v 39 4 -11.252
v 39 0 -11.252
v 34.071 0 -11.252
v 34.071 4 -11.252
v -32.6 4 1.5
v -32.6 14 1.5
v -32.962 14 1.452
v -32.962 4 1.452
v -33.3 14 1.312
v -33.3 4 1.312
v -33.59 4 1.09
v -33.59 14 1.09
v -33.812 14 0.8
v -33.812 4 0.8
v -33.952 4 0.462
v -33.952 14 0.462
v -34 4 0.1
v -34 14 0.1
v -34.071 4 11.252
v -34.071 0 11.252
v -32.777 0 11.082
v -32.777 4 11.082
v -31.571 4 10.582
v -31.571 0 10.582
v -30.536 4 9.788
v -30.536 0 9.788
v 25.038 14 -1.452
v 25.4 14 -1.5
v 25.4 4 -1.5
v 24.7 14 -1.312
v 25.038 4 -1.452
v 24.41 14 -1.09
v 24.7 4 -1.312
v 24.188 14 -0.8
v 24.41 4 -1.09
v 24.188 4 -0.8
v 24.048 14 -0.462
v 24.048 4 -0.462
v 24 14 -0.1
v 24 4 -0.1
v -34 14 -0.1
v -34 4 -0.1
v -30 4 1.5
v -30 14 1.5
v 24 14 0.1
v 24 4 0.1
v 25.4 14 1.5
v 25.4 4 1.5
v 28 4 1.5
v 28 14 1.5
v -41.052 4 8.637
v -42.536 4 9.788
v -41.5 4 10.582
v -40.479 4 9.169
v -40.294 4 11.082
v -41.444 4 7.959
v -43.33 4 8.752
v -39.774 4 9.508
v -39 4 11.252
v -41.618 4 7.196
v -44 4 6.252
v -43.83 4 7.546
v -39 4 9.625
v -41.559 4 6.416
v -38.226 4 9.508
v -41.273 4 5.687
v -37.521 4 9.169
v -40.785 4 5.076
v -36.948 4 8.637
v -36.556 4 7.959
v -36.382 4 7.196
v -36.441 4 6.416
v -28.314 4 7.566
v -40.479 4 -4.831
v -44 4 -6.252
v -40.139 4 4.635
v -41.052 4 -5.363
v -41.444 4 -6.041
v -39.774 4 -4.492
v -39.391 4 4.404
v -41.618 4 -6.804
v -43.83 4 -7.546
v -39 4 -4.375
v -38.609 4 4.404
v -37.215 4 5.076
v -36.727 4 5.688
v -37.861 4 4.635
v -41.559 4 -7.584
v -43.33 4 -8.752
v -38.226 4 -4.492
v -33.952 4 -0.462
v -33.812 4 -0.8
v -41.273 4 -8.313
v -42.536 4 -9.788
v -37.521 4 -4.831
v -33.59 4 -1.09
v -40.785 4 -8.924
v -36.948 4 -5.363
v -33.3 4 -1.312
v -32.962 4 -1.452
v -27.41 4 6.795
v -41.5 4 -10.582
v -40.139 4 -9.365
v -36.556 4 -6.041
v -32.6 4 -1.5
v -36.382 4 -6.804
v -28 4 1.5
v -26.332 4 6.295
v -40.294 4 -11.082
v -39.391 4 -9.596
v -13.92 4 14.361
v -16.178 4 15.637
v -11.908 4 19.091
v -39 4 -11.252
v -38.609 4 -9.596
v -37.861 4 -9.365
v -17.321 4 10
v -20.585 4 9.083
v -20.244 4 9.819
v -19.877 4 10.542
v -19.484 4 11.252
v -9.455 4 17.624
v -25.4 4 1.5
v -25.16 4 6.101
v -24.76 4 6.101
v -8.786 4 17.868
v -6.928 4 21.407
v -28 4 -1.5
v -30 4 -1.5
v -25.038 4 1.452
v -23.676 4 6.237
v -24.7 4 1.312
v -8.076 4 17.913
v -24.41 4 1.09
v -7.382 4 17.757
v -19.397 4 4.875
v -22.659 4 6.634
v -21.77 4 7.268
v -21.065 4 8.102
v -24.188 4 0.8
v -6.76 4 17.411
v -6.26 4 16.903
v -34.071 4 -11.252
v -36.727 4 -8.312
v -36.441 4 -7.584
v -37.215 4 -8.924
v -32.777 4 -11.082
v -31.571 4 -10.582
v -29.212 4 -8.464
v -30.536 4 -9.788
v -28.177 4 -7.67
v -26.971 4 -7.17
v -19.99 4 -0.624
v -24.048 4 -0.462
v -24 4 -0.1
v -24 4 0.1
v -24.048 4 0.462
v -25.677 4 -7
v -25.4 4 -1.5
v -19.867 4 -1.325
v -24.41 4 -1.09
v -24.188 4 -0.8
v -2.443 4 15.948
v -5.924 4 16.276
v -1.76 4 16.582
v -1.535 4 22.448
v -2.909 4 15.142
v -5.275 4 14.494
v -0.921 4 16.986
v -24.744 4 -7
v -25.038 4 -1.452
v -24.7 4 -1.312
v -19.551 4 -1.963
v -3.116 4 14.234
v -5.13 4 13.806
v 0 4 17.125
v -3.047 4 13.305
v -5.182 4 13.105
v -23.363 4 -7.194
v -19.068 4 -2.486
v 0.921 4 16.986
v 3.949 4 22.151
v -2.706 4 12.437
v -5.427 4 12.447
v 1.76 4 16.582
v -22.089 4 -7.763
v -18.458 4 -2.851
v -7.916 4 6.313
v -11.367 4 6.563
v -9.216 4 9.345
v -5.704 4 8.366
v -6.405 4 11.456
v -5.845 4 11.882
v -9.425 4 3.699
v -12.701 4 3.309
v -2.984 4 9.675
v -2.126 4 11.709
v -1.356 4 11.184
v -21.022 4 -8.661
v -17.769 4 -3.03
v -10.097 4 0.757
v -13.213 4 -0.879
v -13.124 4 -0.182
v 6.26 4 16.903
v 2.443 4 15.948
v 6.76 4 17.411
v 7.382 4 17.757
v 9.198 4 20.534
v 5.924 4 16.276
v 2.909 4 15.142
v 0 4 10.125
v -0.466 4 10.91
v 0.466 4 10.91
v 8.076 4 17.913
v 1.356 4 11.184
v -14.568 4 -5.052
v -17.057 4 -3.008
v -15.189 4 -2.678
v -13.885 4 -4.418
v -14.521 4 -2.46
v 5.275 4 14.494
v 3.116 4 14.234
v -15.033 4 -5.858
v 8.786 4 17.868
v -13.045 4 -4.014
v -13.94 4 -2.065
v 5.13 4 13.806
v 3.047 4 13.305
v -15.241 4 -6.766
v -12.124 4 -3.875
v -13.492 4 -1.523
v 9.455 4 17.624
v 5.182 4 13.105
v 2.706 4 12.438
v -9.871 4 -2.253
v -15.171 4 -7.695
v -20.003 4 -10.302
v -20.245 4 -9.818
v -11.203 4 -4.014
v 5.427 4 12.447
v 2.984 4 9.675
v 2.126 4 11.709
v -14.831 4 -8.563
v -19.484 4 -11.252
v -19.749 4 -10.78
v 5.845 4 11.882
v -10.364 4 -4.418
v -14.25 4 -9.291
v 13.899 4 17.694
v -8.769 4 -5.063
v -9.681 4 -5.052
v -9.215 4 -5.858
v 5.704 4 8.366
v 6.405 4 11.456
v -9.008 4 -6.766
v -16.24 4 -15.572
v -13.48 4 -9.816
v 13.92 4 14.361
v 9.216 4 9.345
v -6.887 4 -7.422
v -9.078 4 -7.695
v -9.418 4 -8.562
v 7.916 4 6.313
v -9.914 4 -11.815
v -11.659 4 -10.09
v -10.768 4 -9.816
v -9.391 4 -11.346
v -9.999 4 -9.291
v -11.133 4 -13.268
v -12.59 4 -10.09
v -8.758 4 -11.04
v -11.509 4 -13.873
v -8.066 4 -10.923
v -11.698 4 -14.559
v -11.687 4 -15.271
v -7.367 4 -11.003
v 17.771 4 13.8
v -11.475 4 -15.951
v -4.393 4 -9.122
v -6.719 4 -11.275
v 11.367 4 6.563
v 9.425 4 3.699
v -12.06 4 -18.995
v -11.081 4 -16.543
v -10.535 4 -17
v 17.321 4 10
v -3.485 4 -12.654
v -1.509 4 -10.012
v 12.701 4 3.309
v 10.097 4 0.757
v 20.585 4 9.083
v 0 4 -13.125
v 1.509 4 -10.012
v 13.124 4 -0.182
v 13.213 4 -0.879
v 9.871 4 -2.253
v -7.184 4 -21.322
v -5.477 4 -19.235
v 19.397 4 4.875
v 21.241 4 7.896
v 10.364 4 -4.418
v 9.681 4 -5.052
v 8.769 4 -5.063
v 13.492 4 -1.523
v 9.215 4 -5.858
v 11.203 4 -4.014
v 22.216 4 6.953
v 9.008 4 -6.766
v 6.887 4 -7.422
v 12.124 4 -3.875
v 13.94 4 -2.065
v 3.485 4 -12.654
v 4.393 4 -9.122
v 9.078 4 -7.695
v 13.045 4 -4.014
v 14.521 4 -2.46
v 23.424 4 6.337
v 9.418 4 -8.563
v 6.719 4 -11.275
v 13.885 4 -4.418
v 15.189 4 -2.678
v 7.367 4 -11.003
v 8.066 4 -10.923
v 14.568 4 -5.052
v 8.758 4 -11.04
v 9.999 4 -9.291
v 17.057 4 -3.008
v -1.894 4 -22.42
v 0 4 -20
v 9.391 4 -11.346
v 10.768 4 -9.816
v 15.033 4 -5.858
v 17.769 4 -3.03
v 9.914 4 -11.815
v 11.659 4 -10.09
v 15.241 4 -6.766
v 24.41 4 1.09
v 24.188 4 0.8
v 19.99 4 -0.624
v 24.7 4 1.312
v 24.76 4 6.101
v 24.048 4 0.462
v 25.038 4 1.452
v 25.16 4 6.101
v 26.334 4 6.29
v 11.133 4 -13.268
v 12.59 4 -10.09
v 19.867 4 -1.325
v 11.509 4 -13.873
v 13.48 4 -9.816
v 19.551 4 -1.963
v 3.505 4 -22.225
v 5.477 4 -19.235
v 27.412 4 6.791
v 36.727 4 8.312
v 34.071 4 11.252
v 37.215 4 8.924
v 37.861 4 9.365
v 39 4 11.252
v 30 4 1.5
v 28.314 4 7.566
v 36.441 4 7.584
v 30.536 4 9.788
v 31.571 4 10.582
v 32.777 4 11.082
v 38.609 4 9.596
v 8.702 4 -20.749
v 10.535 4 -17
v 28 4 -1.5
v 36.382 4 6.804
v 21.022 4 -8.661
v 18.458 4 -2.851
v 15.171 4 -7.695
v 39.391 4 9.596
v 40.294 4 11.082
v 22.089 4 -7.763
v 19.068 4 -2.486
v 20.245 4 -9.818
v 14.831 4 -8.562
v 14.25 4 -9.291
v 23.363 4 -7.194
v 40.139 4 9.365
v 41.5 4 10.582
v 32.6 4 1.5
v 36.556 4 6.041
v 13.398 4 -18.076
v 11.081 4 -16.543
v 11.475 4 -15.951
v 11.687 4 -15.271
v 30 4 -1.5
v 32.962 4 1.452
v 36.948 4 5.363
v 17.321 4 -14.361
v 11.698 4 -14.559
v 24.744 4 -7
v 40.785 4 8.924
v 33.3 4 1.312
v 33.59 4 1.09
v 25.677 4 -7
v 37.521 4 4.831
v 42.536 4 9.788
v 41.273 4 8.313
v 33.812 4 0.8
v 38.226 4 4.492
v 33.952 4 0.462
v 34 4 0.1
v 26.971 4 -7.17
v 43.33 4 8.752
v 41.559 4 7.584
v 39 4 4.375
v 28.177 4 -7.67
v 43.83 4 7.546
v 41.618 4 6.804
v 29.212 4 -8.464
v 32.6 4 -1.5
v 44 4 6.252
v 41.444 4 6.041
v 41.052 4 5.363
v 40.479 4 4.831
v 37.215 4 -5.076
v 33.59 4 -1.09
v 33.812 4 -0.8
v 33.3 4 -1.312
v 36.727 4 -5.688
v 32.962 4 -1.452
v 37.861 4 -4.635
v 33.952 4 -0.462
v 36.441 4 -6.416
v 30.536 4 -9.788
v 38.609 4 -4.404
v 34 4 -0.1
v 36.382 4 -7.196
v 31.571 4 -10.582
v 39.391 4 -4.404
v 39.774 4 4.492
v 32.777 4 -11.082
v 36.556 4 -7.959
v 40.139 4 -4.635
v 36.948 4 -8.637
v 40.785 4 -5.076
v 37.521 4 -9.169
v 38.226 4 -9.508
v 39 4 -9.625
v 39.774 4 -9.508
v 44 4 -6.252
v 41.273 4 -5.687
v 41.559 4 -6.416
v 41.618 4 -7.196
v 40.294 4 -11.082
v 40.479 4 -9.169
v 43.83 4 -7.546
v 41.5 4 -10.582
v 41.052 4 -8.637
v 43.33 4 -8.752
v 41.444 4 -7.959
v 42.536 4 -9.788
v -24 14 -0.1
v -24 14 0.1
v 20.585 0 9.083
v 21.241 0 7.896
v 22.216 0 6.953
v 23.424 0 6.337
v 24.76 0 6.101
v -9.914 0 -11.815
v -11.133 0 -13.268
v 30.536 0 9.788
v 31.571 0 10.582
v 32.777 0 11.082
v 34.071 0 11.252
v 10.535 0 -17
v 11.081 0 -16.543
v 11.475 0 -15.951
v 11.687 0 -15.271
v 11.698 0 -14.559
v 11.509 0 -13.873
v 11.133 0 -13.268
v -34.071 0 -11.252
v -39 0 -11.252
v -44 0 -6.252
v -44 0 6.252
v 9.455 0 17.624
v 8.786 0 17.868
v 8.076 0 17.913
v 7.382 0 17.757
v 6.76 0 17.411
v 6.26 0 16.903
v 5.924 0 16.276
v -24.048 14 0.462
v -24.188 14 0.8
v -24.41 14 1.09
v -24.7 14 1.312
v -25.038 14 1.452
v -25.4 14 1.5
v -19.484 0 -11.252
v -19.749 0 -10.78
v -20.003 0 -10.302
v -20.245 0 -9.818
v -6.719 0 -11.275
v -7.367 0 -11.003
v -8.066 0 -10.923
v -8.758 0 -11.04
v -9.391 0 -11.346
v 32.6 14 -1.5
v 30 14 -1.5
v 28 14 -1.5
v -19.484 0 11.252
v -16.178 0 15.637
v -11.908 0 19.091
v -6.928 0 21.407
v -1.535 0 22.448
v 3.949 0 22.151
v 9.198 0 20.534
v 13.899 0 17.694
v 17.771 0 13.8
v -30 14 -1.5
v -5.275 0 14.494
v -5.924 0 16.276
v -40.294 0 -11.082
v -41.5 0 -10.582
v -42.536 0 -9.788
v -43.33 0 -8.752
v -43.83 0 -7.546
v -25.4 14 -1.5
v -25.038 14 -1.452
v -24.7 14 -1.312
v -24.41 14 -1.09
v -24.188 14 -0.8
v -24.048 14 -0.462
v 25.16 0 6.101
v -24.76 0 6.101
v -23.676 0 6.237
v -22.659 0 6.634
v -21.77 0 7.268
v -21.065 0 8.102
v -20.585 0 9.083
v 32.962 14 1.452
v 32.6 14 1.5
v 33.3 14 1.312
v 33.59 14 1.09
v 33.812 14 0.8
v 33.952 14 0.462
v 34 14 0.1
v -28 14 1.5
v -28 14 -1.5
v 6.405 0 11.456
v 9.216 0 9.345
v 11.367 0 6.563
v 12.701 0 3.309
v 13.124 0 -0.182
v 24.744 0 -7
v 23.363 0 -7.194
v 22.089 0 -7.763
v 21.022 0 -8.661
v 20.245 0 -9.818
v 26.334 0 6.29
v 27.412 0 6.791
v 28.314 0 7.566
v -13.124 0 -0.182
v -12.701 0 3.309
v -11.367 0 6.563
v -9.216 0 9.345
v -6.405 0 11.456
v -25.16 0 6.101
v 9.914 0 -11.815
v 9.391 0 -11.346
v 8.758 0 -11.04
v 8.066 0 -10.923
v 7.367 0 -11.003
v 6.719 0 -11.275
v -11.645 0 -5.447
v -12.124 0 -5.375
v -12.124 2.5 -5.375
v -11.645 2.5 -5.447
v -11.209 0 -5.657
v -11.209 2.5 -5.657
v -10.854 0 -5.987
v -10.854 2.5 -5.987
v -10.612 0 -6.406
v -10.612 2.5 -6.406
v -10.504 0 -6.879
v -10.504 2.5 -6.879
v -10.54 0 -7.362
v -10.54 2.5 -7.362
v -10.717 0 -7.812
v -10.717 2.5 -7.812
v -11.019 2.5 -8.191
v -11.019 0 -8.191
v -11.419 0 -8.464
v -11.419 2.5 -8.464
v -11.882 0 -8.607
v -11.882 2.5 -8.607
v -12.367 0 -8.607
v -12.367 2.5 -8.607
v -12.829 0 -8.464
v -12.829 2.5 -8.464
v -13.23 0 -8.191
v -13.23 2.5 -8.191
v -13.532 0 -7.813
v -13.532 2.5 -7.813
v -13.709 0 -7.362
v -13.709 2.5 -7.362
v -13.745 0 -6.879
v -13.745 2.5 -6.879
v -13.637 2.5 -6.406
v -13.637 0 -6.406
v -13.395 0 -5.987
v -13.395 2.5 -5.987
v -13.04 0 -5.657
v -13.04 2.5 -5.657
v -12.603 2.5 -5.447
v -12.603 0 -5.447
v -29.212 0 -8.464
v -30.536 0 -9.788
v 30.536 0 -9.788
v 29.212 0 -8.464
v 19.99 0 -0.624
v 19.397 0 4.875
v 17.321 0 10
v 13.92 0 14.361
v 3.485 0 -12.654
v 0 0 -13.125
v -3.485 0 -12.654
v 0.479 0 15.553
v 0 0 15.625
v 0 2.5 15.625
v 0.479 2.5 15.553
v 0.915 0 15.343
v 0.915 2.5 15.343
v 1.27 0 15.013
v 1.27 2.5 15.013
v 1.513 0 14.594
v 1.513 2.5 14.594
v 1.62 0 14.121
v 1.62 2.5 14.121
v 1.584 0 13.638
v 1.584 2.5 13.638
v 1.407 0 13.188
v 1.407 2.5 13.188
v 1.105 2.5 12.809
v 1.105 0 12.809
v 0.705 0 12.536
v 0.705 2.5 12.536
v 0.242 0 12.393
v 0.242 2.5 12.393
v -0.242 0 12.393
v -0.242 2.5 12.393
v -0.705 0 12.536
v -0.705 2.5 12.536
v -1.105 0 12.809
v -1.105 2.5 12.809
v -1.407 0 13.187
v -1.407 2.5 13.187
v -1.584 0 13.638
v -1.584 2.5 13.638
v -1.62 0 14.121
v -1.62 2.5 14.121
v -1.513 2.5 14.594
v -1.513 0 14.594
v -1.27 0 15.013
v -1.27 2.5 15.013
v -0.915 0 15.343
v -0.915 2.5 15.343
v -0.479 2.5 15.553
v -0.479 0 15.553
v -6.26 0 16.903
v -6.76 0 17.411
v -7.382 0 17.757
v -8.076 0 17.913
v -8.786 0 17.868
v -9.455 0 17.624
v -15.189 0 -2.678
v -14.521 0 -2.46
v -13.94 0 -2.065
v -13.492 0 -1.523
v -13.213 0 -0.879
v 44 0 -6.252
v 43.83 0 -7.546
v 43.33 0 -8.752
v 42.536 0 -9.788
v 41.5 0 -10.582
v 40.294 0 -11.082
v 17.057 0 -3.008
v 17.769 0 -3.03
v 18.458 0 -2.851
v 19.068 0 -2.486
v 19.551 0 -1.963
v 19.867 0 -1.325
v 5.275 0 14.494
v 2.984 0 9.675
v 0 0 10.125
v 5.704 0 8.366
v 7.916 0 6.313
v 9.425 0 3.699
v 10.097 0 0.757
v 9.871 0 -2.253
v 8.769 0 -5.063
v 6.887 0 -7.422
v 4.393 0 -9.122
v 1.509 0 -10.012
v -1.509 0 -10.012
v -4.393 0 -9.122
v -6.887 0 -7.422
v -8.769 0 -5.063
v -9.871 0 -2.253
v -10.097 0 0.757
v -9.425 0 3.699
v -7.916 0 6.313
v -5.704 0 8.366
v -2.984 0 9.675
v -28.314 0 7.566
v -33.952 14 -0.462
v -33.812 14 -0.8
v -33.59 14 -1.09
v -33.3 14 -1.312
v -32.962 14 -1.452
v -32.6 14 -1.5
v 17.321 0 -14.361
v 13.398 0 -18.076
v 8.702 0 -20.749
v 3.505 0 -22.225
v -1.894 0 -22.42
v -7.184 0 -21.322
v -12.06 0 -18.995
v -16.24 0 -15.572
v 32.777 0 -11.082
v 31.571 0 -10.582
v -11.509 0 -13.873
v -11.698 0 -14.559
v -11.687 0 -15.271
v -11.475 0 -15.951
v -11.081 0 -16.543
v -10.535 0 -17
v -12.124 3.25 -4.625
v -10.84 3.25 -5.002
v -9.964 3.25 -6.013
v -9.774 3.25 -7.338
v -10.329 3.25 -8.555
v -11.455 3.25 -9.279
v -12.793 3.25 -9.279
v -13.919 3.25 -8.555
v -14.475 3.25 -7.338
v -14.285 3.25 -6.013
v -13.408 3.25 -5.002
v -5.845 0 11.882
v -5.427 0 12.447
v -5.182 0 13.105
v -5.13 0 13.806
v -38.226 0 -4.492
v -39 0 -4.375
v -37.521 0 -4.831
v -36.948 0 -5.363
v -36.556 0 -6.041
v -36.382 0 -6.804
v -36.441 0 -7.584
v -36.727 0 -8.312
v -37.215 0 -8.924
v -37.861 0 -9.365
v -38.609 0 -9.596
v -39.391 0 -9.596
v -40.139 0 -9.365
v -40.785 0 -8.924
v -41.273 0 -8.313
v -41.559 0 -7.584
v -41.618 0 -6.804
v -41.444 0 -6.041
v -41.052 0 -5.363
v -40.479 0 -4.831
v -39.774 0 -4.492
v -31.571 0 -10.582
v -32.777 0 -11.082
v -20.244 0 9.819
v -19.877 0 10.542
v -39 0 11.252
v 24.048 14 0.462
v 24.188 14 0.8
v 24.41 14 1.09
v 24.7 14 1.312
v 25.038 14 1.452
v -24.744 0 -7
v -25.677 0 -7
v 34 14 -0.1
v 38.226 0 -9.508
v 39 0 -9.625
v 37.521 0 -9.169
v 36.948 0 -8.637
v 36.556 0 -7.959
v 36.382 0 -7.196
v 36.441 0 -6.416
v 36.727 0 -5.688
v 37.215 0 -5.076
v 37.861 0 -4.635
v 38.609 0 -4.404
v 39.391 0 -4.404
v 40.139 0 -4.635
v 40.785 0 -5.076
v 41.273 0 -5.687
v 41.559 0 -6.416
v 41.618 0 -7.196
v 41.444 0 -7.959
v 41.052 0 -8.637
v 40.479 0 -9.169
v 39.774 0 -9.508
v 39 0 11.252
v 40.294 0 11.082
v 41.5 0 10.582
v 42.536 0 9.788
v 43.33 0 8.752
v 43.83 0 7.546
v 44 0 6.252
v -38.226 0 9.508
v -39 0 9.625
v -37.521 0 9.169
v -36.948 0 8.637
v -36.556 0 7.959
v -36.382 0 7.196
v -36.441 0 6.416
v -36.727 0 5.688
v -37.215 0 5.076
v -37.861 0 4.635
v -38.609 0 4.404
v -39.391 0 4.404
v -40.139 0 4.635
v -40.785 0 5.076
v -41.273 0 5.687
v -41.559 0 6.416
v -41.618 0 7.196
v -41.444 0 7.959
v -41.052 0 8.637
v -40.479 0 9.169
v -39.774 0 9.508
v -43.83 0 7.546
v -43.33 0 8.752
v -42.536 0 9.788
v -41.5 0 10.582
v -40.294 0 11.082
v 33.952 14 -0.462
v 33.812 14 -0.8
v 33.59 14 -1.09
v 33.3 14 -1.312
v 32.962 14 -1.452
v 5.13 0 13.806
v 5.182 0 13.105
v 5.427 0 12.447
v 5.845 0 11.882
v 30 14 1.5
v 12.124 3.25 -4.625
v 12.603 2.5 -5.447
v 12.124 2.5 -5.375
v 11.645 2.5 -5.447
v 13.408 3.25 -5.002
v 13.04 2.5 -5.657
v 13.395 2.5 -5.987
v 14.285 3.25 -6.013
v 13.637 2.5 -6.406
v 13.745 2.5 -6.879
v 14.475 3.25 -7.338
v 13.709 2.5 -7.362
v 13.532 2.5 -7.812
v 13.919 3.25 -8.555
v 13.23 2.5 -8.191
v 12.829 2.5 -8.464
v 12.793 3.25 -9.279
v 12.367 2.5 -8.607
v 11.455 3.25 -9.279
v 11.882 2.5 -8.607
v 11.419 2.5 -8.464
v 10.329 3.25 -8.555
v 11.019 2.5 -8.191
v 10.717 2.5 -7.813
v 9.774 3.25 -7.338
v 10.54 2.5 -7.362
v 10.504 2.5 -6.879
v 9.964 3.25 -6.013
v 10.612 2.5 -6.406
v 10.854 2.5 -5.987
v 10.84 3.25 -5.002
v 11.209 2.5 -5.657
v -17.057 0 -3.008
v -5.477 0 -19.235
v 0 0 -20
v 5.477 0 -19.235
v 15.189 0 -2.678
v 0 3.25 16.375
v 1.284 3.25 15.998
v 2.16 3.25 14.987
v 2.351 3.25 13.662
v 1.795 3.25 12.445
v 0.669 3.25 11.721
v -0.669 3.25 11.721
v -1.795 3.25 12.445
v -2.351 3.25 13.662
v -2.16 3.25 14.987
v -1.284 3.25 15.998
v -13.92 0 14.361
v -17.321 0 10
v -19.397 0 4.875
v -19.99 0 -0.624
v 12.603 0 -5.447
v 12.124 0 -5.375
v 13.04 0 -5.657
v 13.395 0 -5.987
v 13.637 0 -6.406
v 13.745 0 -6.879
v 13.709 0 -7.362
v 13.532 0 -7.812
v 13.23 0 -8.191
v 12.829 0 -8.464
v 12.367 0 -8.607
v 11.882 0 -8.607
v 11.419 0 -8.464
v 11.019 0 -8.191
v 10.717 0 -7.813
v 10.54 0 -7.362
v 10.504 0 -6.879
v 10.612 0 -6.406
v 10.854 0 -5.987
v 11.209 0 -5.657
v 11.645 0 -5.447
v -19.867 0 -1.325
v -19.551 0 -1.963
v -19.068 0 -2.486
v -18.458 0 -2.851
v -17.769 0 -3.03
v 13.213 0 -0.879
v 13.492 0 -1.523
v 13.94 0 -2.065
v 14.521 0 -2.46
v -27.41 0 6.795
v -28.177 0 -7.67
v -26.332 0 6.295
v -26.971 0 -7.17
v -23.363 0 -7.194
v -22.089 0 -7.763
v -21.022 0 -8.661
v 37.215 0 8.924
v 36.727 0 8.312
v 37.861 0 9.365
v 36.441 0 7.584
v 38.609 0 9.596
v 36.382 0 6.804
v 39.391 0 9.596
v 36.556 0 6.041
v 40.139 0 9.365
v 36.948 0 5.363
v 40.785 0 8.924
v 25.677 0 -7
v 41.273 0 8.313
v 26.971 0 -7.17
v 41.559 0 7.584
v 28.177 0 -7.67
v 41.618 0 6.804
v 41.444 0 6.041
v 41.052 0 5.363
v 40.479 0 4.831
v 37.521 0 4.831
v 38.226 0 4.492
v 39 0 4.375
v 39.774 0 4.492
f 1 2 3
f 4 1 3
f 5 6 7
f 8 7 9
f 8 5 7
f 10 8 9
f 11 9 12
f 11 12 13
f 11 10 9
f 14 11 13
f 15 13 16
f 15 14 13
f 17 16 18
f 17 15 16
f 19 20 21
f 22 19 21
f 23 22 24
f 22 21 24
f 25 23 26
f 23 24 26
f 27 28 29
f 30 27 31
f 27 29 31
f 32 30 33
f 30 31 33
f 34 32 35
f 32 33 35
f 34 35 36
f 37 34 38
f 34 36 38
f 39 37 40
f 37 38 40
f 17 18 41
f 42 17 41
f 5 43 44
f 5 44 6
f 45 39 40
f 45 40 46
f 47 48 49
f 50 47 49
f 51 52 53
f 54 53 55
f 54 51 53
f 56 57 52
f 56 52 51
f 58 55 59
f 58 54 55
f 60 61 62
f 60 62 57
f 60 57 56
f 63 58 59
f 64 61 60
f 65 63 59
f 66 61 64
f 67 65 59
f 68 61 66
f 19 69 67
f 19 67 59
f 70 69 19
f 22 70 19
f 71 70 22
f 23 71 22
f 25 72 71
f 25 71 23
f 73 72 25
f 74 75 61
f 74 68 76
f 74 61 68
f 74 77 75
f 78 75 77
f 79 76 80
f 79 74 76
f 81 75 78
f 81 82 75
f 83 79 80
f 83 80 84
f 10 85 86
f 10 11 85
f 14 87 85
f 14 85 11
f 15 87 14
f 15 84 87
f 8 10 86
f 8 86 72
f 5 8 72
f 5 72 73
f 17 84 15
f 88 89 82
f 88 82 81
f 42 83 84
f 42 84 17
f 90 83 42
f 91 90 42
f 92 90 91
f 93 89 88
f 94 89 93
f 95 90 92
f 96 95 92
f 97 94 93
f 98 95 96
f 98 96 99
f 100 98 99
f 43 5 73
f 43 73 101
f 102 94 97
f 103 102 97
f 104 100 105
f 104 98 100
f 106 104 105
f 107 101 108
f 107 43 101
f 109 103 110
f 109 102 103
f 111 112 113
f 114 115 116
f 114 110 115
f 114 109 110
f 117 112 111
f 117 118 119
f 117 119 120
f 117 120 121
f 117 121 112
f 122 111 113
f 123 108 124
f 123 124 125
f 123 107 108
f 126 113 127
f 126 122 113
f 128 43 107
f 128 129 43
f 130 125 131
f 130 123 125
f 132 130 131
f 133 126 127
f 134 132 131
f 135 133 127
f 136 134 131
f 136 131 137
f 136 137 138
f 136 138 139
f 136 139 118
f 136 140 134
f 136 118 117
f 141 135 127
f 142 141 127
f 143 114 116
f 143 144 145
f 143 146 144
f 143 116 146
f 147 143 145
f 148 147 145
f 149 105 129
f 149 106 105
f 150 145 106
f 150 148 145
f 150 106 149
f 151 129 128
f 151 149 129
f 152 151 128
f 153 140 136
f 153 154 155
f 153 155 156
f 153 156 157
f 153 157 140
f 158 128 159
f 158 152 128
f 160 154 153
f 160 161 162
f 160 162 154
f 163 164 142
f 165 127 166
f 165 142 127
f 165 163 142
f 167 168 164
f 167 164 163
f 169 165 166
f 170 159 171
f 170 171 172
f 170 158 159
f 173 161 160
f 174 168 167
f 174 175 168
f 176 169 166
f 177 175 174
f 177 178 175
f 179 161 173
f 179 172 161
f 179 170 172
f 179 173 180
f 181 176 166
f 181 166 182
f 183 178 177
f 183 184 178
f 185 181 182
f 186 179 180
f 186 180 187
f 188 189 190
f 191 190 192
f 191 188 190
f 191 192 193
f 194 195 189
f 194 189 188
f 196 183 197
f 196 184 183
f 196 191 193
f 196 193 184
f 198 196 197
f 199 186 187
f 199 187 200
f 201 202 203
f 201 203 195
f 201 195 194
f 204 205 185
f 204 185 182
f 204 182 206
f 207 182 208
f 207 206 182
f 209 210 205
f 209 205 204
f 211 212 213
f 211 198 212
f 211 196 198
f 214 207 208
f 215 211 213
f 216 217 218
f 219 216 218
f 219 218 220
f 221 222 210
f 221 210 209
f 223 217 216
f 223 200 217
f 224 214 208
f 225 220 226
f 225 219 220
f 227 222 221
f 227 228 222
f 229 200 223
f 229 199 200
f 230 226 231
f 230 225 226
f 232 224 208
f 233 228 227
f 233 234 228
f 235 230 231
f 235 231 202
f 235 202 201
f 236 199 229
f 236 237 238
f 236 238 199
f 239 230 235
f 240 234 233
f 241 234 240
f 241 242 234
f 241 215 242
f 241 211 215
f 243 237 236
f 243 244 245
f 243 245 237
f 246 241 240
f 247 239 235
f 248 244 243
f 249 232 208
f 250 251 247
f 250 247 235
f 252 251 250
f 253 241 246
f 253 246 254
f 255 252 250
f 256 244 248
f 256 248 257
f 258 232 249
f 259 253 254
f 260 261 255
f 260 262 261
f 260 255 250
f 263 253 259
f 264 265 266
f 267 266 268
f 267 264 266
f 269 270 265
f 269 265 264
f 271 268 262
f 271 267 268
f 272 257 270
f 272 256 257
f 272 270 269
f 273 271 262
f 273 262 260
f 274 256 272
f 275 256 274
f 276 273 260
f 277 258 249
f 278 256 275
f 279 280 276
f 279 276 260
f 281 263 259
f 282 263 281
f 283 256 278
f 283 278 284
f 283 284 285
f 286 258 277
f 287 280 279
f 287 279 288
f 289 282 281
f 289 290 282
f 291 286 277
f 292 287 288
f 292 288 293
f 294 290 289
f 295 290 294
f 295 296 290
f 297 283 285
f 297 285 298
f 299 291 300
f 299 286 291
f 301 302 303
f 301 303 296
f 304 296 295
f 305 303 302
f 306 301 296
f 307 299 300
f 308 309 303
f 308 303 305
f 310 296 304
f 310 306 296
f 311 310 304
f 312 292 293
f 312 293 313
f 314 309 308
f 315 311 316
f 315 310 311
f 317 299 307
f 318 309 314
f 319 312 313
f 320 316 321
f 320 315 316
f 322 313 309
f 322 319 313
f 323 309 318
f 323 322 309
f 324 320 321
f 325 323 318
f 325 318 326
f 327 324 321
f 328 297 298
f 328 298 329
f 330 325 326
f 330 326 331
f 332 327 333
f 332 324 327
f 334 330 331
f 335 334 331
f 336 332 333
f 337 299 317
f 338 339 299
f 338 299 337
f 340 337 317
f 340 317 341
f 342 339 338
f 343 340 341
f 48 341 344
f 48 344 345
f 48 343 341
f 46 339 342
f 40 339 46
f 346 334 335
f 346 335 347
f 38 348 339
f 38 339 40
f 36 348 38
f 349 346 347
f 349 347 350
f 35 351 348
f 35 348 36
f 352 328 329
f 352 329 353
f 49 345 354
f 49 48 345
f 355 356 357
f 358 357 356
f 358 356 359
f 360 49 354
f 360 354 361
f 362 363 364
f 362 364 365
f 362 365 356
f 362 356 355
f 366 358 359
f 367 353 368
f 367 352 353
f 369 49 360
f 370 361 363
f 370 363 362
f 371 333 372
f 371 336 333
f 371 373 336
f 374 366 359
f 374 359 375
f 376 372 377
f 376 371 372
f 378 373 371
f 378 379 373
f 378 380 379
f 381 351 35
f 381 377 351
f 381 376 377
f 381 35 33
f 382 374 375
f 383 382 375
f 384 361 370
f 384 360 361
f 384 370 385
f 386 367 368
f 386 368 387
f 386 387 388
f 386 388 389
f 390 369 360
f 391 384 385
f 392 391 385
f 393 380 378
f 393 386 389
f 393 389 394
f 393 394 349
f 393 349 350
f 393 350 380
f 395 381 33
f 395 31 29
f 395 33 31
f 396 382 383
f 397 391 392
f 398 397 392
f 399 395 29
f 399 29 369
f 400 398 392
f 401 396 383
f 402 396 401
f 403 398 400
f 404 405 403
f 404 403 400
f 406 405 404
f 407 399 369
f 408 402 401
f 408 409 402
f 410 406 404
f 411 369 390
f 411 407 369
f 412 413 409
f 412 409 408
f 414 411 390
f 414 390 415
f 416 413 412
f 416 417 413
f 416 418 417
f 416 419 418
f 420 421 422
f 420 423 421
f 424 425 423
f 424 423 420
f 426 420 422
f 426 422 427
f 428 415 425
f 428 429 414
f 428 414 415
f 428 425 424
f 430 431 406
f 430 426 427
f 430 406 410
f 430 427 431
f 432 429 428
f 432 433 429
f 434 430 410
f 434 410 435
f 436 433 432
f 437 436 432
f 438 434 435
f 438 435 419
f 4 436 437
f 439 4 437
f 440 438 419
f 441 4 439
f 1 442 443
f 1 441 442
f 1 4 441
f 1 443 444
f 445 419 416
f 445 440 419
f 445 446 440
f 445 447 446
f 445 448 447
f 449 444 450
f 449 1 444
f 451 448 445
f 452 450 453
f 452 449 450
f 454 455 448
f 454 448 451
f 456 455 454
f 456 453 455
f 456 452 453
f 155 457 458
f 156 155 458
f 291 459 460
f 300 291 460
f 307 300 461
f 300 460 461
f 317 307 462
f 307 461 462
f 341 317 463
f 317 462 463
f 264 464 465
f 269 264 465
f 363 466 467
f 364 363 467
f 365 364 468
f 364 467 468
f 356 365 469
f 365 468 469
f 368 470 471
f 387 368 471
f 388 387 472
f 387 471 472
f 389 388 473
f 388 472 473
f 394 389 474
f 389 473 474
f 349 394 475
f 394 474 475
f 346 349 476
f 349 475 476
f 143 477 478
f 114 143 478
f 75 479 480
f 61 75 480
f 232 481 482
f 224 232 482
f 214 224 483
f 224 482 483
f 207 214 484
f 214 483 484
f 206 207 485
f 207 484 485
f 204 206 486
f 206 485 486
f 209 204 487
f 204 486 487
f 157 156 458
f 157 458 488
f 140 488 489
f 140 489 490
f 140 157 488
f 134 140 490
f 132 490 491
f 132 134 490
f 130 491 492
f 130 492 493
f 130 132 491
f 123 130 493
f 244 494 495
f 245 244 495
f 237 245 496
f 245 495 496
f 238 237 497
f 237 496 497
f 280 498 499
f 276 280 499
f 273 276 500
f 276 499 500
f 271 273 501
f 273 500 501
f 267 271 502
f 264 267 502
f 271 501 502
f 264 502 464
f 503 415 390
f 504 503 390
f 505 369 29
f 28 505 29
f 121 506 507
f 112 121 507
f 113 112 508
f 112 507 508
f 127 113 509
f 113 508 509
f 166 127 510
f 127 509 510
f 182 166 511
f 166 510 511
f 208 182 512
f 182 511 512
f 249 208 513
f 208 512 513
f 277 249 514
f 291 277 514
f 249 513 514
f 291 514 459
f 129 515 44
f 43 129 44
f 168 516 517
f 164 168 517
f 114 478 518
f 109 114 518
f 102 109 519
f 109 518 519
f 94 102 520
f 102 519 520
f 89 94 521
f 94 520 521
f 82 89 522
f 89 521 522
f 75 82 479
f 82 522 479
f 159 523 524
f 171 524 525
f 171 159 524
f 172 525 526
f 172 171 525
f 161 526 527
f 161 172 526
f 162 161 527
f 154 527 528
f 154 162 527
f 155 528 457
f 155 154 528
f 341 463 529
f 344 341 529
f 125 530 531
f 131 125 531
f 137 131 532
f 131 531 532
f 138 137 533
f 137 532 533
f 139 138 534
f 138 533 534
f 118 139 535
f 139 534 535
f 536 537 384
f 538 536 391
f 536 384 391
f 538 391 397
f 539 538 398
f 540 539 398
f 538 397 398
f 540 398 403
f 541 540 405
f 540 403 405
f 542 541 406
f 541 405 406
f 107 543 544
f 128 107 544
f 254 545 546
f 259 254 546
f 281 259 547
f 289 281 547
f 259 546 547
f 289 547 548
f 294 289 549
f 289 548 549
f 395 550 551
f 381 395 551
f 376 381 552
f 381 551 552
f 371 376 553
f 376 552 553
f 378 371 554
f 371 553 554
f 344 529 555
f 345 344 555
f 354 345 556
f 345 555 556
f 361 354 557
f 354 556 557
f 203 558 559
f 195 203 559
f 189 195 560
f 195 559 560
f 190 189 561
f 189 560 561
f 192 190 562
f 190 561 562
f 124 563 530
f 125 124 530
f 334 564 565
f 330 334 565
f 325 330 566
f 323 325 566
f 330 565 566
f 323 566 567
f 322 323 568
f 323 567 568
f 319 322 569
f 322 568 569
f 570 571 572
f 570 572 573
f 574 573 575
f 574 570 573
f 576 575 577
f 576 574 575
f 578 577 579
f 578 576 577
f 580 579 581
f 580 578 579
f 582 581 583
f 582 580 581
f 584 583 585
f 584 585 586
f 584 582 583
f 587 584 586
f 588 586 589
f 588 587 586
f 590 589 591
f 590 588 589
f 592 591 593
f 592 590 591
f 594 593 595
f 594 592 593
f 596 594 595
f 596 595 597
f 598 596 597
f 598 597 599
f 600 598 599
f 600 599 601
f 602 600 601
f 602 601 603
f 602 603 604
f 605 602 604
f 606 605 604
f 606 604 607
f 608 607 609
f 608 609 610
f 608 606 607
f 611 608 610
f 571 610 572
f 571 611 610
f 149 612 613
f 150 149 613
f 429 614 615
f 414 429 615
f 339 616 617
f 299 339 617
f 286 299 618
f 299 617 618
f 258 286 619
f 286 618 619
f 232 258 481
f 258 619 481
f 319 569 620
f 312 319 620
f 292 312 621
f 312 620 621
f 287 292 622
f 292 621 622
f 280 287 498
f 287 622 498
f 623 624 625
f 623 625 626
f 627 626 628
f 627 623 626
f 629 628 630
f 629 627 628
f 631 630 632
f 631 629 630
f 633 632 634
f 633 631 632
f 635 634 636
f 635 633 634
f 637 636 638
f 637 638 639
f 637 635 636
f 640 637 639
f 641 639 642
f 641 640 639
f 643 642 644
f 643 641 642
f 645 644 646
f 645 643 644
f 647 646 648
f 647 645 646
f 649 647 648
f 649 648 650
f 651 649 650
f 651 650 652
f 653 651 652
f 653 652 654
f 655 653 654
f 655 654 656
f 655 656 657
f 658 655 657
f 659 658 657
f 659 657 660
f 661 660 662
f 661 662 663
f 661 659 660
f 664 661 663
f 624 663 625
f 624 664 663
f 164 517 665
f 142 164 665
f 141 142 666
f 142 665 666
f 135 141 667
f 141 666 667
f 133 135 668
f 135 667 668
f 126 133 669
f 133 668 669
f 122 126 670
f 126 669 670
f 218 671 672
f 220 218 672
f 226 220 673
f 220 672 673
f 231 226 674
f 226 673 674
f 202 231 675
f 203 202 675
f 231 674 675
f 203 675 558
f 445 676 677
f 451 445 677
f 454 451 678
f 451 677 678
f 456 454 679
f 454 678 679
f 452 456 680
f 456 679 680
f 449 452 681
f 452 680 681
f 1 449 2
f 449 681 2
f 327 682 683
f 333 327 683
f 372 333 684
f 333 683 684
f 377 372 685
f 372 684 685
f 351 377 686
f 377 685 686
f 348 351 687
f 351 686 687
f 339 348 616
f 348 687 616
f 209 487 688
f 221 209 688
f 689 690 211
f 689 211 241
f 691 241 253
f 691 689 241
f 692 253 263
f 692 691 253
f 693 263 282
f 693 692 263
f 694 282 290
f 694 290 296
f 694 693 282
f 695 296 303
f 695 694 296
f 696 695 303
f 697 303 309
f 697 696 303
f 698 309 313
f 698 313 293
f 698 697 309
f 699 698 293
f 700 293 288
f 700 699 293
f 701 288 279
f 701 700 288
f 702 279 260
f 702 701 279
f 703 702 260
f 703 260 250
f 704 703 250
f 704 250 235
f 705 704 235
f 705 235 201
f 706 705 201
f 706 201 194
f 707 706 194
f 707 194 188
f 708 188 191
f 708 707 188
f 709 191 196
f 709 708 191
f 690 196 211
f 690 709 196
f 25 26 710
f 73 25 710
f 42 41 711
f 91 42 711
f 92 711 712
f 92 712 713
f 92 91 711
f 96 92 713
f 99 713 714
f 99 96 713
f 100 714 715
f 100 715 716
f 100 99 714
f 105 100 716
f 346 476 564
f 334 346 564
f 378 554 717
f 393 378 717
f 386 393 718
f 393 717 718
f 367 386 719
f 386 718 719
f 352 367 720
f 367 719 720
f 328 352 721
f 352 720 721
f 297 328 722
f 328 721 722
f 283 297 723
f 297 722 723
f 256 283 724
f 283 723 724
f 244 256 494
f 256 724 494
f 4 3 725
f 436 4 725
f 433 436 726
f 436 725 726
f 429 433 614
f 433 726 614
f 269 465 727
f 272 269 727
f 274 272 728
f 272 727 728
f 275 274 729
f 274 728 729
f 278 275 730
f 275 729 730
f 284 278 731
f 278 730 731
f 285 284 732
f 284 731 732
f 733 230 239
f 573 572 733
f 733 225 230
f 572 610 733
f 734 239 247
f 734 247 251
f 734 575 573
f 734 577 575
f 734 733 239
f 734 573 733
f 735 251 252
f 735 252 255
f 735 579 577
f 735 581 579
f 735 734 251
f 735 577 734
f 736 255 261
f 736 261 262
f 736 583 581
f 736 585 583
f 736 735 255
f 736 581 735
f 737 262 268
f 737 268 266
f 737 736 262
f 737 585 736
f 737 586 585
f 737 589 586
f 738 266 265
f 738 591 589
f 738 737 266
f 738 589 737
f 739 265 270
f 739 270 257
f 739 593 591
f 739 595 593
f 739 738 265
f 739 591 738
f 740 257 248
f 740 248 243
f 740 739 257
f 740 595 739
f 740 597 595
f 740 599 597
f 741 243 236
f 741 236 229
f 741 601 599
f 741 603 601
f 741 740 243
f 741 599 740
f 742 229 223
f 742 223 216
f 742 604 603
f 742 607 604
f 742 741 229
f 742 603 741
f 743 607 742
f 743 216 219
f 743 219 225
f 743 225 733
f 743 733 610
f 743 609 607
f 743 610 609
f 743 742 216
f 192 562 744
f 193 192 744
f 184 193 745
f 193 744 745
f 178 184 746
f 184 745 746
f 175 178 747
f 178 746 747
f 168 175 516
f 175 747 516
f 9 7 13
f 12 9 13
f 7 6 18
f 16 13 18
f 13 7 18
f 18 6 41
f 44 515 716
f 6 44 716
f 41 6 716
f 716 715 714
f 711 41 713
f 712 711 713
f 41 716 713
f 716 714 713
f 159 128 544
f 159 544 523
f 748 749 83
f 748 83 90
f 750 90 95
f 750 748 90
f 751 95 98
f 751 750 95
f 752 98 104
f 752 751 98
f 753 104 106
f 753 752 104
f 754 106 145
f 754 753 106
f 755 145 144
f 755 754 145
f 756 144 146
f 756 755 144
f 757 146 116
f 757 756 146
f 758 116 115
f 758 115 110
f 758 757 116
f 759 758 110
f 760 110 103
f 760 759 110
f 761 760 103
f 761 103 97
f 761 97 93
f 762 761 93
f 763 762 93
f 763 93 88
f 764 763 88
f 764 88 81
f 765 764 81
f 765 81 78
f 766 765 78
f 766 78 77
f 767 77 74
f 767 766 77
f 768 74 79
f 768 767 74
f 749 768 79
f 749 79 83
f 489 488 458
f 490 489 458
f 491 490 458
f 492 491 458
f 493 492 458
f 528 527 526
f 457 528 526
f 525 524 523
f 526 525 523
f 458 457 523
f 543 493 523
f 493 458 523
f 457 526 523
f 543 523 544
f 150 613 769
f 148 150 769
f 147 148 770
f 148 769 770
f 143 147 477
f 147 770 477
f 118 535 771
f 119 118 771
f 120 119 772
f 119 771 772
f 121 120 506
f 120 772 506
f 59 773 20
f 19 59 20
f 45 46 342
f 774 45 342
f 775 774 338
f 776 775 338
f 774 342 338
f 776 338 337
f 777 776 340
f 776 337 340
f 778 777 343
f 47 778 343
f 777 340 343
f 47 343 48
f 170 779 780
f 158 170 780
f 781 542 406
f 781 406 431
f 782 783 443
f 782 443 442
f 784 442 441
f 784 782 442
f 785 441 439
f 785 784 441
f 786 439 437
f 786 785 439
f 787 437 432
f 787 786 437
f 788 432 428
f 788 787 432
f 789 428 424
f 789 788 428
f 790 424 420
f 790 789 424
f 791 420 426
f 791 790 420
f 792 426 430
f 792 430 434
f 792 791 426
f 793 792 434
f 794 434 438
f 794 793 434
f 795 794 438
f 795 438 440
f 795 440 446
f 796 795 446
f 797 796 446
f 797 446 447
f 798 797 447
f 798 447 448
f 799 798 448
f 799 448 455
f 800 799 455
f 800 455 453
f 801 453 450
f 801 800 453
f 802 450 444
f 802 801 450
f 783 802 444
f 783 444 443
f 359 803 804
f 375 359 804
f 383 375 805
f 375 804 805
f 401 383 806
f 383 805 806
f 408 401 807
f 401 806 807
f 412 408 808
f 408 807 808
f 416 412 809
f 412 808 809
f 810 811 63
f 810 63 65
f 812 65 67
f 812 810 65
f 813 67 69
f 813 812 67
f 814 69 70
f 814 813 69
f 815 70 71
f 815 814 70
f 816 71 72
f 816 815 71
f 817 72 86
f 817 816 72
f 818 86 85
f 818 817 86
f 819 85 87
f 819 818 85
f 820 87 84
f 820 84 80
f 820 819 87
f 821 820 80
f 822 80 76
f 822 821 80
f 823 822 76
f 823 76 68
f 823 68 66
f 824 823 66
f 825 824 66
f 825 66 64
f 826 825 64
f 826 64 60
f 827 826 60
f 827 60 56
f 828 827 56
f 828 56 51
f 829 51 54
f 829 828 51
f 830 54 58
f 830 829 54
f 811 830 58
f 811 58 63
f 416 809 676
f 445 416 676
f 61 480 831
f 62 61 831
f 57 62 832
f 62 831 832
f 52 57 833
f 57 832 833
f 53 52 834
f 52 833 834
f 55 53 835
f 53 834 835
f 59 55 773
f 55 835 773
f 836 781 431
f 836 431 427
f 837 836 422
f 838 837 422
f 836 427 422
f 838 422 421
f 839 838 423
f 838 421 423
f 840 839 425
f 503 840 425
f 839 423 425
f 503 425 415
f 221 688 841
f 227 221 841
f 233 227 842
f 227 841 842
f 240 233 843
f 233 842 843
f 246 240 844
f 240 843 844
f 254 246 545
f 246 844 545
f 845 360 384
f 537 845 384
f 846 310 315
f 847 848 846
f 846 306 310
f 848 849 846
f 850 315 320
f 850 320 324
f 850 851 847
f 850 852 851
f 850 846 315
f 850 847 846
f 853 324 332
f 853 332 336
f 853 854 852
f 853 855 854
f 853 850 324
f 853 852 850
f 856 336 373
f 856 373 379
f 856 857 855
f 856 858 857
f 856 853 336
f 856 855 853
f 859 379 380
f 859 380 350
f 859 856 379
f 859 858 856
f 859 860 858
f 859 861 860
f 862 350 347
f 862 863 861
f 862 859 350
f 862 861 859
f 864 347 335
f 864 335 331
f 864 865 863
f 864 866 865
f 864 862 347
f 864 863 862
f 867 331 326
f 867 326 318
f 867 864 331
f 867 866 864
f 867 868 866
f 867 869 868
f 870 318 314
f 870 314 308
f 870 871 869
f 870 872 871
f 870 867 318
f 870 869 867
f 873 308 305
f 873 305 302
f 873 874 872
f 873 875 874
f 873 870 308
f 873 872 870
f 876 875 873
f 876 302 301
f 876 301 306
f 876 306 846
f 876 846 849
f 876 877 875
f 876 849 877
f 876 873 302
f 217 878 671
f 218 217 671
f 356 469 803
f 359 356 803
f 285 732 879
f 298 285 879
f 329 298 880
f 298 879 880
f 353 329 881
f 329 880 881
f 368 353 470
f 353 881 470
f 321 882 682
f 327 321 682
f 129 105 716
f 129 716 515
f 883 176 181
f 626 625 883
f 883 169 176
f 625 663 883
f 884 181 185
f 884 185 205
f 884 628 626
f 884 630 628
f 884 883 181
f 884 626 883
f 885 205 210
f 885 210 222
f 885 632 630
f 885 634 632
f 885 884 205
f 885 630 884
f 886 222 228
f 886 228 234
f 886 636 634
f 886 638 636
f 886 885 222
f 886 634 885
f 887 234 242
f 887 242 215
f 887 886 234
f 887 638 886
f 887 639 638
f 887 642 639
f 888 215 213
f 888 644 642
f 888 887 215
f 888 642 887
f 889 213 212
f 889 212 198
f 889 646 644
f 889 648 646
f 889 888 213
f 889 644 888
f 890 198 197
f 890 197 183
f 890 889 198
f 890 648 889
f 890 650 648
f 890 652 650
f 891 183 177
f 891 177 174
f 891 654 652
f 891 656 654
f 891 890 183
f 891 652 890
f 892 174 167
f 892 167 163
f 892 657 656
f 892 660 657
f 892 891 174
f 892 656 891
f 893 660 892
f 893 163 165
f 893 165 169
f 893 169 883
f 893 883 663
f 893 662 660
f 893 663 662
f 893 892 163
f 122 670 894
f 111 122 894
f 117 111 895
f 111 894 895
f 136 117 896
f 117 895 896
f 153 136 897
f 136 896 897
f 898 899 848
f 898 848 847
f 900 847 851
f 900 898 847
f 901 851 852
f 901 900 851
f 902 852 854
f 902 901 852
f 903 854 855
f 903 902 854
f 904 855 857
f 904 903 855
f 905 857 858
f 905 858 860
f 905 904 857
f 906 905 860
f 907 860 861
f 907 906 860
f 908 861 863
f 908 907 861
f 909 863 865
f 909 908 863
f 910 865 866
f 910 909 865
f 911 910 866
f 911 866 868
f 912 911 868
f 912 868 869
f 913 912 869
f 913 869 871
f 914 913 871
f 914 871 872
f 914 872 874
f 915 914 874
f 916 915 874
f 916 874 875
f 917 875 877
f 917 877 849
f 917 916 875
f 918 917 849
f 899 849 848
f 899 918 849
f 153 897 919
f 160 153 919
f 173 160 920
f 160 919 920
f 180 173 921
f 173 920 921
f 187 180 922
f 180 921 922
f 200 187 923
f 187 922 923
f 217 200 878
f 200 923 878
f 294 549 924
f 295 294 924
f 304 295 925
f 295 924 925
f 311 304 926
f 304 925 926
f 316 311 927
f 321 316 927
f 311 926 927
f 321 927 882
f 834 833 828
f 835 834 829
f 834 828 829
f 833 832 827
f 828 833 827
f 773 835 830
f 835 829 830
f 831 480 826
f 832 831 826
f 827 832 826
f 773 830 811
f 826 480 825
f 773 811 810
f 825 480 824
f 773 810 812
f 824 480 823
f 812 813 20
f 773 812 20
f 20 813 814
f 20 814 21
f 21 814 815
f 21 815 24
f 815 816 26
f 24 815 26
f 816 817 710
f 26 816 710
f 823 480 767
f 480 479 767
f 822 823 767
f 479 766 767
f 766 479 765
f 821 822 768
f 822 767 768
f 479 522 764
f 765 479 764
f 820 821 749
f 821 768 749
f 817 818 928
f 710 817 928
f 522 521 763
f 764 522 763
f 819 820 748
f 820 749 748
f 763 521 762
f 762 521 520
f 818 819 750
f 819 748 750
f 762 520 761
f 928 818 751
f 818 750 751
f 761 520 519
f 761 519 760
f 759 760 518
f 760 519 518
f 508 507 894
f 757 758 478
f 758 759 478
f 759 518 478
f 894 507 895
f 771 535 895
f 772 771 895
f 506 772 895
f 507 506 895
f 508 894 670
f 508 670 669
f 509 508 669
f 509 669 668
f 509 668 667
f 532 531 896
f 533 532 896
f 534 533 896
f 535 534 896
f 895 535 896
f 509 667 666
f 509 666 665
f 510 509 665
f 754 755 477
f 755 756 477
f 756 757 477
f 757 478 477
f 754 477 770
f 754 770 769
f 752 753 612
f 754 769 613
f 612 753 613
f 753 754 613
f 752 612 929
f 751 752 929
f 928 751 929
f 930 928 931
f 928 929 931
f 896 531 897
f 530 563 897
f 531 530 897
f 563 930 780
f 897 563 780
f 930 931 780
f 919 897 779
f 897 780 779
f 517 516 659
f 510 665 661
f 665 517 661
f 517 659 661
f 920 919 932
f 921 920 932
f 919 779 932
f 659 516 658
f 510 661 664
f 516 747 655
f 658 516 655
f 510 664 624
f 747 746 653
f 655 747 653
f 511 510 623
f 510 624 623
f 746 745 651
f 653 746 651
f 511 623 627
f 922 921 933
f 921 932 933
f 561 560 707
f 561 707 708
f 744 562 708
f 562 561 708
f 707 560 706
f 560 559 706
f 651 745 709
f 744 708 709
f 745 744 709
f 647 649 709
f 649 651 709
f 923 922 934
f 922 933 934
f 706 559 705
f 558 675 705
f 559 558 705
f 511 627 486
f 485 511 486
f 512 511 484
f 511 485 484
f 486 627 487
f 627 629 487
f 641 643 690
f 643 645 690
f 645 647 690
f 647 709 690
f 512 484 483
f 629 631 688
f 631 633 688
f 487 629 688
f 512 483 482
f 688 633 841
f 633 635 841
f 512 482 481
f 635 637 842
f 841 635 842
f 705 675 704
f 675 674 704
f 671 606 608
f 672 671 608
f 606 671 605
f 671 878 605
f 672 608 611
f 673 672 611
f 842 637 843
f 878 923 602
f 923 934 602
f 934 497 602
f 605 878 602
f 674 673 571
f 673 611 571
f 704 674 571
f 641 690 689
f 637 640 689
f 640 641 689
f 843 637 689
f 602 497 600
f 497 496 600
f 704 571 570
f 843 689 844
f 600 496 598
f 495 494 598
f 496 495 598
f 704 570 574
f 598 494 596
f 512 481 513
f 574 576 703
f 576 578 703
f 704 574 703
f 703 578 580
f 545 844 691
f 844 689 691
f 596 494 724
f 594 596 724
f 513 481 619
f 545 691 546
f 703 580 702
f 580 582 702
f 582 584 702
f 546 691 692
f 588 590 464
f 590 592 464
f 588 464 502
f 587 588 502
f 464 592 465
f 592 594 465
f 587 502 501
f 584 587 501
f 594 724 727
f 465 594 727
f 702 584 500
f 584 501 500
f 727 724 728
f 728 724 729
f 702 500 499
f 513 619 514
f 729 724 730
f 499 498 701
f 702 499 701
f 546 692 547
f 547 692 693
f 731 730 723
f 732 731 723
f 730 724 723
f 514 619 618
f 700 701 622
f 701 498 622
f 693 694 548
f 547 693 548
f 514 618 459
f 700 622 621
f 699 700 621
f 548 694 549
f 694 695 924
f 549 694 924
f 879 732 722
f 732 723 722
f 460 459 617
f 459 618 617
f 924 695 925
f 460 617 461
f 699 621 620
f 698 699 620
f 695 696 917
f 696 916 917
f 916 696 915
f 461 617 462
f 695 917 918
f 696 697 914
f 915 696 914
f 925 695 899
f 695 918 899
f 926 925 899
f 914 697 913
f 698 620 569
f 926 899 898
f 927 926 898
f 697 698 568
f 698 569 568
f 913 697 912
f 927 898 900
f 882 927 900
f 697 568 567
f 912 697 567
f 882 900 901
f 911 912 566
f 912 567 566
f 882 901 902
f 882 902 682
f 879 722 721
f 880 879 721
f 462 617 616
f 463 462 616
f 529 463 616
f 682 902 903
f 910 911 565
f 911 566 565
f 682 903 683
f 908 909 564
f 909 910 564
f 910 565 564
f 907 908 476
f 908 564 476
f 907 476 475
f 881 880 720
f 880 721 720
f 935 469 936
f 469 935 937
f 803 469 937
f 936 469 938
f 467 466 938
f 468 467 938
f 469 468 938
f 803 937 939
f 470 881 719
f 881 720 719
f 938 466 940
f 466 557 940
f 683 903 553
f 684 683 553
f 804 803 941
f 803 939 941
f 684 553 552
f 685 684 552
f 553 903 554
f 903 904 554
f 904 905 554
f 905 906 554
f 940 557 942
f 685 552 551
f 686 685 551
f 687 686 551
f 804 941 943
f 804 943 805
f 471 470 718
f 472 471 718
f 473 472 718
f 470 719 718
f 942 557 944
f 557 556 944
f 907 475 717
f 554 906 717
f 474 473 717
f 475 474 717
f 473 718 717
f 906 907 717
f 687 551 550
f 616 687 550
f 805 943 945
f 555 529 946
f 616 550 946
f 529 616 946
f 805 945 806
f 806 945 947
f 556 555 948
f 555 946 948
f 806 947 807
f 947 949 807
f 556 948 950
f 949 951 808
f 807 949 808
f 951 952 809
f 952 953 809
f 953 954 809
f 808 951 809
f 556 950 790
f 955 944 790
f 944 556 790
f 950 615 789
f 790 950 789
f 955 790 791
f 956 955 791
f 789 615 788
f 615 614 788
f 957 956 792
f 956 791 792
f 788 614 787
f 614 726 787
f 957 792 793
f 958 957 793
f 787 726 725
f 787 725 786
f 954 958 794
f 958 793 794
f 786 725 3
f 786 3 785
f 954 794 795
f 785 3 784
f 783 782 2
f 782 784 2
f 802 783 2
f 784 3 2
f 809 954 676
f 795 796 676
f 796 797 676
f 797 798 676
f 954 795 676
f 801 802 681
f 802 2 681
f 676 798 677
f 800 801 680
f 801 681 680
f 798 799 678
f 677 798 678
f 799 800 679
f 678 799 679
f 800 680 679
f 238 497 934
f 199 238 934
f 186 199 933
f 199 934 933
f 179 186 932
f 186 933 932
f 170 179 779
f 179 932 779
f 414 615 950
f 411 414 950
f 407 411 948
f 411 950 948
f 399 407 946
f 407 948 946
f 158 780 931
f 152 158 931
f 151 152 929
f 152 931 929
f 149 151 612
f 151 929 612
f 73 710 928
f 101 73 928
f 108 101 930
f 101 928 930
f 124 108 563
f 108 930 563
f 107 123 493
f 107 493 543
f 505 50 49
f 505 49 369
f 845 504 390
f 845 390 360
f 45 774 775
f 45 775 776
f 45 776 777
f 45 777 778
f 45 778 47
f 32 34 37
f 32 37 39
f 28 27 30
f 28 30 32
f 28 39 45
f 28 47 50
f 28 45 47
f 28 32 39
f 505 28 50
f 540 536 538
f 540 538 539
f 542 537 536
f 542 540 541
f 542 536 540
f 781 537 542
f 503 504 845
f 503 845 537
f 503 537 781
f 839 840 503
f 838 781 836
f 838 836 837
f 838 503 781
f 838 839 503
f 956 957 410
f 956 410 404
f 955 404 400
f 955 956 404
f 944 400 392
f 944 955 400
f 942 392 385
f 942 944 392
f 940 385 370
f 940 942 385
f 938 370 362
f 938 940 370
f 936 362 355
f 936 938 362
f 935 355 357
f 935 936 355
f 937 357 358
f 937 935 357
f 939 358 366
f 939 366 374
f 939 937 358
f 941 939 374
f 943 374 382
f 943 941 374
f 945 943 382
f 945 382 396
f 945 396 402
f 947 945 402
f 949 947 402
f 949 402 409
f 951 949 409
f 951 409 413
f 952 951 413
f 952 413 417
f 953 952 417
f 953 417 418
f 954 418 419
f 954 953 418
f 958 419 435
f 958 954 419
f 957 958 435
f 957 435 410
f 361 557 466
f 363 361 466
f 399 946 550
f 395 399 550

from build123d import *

# Parameters (mm, degrees)
SKETCH1_R           = 10.125
SKETCH1_R_2         = 1.625
SKETCH1_R_3         = 2.625
BOSS_EXTRUDE1_DEPTH = 4
BOSS_EXTRUDE2_DEPTH = 10
CHAMFER1_SIZE       = 1.5


with BuildPart() as part:
    # Sketch1 → Boss-Extrude1 (new body)
    with BuildSketch(Plane(origin=(0, 0, 0), x_dir=(1, 0, 0), z_dir=(0, 1, 0))):
        with BuildLine():
            Line((-34.071067812, 11.251987552), (-39, 11.251987552))
            ThreePointArc((-39, 11.251987552), (-42.535533906, 9.787521458), (-44, 6.251987552))
            Line((-44, 6.251987552), (-44, -6.251987552))
            ThreePointArc((-44, -6.251987552), (-42.535533906, -9.787521458), (-39, -11.251987552))
            Line((-39, -11.251987552), (-34.071067812, -11.251987552))
            ThreePointArc((-34.071067812, -11.251987552), (-32.15765065, -10.871385214), (-30.535533906, -9.787521458))
            Line((-30.535533906, -9.787521458), (-28.313936139, -7.565923691))
            ThreePointArc((-28.313936139, -7.565923691), (-26.887697685, -6.508651832), (-25.159643066, -6.101457597))
            Line((-25.159643066, -6.101457597), (-24.760034307, -6.101457597))
            ThreePointArc((-24.760034307, -6.101457597), (-22.194921551, -6.923374854), (-20.585162509, -9.083010761))
            ThreePointArc((-20.585162509, -9.083010761), (-20.064123568, -10.182384075), (-19.484423936, -11.251987552))
            ThreePointArc((-19.484423936, -11.251987552), (1.21615025, -22.467108816), (20.585162509, -9.083010761))
            ThreePointArc((20.585162509, -9.083010761), (22.216290811, -6.953296816), (24.760034307, -6.101457597))
            Line((24.760034307, -6.101457597), (25.159643066, -6.101457597))
            ThreePointArc((25.159643066, -6.101457597), (26.890244586, -6.503166098), (28.313936139, -7.565923691))
            Line((28.313936139, -7.565923691), (30.535533906, -9.787521458))
            ThreePointArc((30.535533906, -9.787521458), (32.15765065, -10.871385214), (34.071067812, -11.251987552))
            Line((34.071067812, -11.251987552), (39, -11.251987552))
            ThreePointArc((39, -11.251987552), (42.535533906, -9.787521458), (44, -6.251987552))
            Line((44, -6.251987552), (44, 6.251987552))
            ThreePointArc((44, 6.251987552), (42.535533906, 9.787521458), (39, 11.251987552))
            Line((39, 11.251987552), (34.071067812, 11.251987552))
            ThreePointArc((34.071067812, 11.251987552), (32.15765065, 10.871385214), (30.535533906, 9.787521458))
            Line((30.535533906, 9.787521458), (29.212478542, 8.464466094))
            ThreePointArc((29.212478542, 8.464466094), (27.590361798, 7.380602337), (25.676944636, 7))
            Line((25.676944636, 7), (24.743686063, 7))
            ThreePointArc((24.743686063, 7), (22.08935855, 7.762719569), (20.244834052, 9.818181818))
            ThreePointArc((20.244834052, 9.818181818), (0.811483584, 22.48536178), (-19.484423936, 11.251987552))
            ThreePointArc((-19.484423936, 11.251987552), (-19.877561088, 10.541943142), (-20.244834052, 9.818181818))
            ThreePointArc((-20.244834052, 9.818181818), (-22.08935855, 7.762719569), (-24.743686063, 7))
            Line((-24.743686063, 7), (-25.676944636, 7))
            ThreePointArc((-25.676944636, 7), (-27.590361798, 7.380602337), (-29.212478542, 8.464466094))
            Line((-29.212478542, 8.464466094), (-30.535533906, 9.787521458))
            ThreePointArc((-30.535533906, 9.787521458), (-32.15765065, 10.871385214), (-34.071067812, 11.251987552))
        make_face()
        with Locations(Location((0, 0, 0), (0, 0, 270))):
            Circle(SKETCH1_R, mode=Mode.SUBTRACT)
        with Locations(Location((-12.124355653, 7, 0), (0, 0, 270))):
            Circle(SKETCH1_R_2, mode=Mode.SUBTRACT)
        with Locations(Location((12.124355653, 7, 0), (0, 0, 270))):
            Circle(SKETCH1_R_2, mode=Mode.SUBTRACT)
        with Locations(Location((0, -14, 0), (0, 0, 270))):
            Circle(SKETCH1_R_2, mode=Mode.SUBTRACT)
        with Locations(Location((-39, 7, 0), (0, 0, 270))):
            Circle(SKETCH1_R_3, mode=Mode.SUBTRACT)
        with Locations(Location((-39, -7, 0), (0, 0, 270))):
            Circle(SKETCH1_R_3, mode=Mode.SUBTRACT)
        with Locations(Location((39, -7, 0), (0, 0, 90))):
            Circle(SKETCH1_R_3, mode=Mode.SUBTRACT)
        with Locations(Location((39, 7, 0), (0, 0, 90))):
            Circle(SKETCH1_R_3, mode=Mode.SUBTRACT)
        with BuildLine():
            Line((-5.27521723, -14.493540222), (-5.923962655, -16.275953627))
            ThreePointArc((-5.923962655, -16.275953627), (-7.381618464, -17.756517255), (-9.455079093, -17.62388945))
            ThreePointArc((-9.455079093, -17.62388945), (-17.320508076, -10), (-19.990275524, 0.623606036))
            ThreePointArc((-19.990275524, 0.623606036), (-19.068404258, 2.485589517), (-17.057370639, 3.007674664))
            Line((-17.057370639, 3.007674664), (-15.189382638, 2.678297979))
            ThreePointArc((-15.189382638, 2.678297979), (-13.697315881, 1.809954494), (-13.123742589, 0.181674021))
            ThreePointArc((-13.123742589, 0.181674021), (-11.366583425, -6.5625), (-6.404536977, -11.456331486))
            ThreePointArc((-6.404536977, -11.456331486), (-5.281191369, -12.767200763), (-5.27521723, -14.493540222))
        make_face(mode=Mode.SUBTRACT)
        with BuildLine():
            Line((-9.914165408, 11.815242243), (-11.133407985, 13.268278963))
            ThreePointArc((-11.133407985, 13.268278963), (-11.686785794, 15.270927738), (-10.535196431, 17.000283414))
            ThreePointArc((-10.535196431, 17.000283414), (0, 20), (10.535196431, 17.000283414))
            ThreePointArc((10.535196431, 17.000283414), (11.686785794, 15.270927738), (11.133407985, 13.268278963))
            Line((11.133407985, 13.268278963), (9.914165408, 11.815242243))
            ThreePointArc((9.914165408, 11.815242243), (8.416124512, 10.95724627), (6.719205612, 11.274657464))
            ThreePointArc((6.719205612, 11.274657464), (0, 13.125), (-6.719205612, 11.274657464))
            ThreePointArc((-6.719205612, 11.274657464), (-8.416124512, 10.95724627), (-9.914165408, 11.815242243))
        make_face(mode=Mode.SUBTRACT)
        with BuildLine():
            Line((15.189382638, 2.678297979), (17.057370639, 3.007674664))
            ThreePointArc((17.057370639, 3.007674664), (19.068404258, 2.485589517), (19.990275524, 0.623606036))
            ThreePointArc((19.990275524, 0.623606036), (17.320508076, -10), (9.455079093, -17.62388945))
            ThreePointArc((9.455079093, -17.62388945), (7.381618464, -17.756517255), (5.923962655, -16.275953627))
            Line((5.923962655, -16.275953627), (5.27521723, -14.493540222))
            ThreePointArc((5.27521723, -14.493540222), (5.281191369, -12.767200763), (6.404536977, -11.456331486))
            ThreePointArc((6.404536977, -11.456331486), (11.366583425, -6.5625), (13.123742589, 0.181674021))
            ThreePointArc((13.123742589, 0.181674021), (13.697315881, 1.809954494), (15.189382638, 2.678297979))
        make_face(mode=Mode.SUBTRACT)
    extrude(amount=BOSS_EXTRUDE1_DEPTH)

    # Sketch2 → Boss-Extrude2 (add)
    with BuildSketch(Plane(origin=(0, 4, 0), x_dir=(1, 0, 0), z_dir=(0, 1, 0))):
        with BuildLine():
            Line((-32.6, 1.5), (-30, 1.5))
            Line((-30, 1.5), (-30, -1.5))
            Line((-30, -1.5), (-32.6, -1.5))
            ThreePointArc((-32.6, -1.5), (-33.589949494, -1.089949494), (-34, -0.1))
            Line((-34, -0.1), (-34, 0.1))
            ThreePointArc((-34, 0.1), (-33.589949494, 1.089949494), (-32.6, 1.5))
        make_face()
        with BuildLine():
            Line((-28, 1.5), (-25.4, 1.5))
            ThreePointArc((-25.4, 1.5), (-24.410050506, 1.089949494), (-24, 0.1))
            Line((-24, 0.1), (-24, -0.1))
            ThreePointArc((-24, -0.1), (-24.410050506, -1.089949494), (-25.4, -1.5))
            Line((-25.4, -1.5), (-28, -1.5))
            Line((-28, -1.5), (-28, 1.5))
        make_face()
    boss_extrude2 = extrude(amount=BOSS_EXTRUDE2_DEPTH)

    # Mirror1: Boss-Extrude2 across plane
    add(boss_extrude2.mirror(Plane(origin=(0, 0, 0), x_dir=(0, 0, 1), z_dir=(1, 0, 0))))

    # Chamfer1
    chamfer1_edges = [part.edges().sort_by_distance(p)[0] for p in [
        (-12.124355653, 4, -8.625),
        (12.124355653, 4, -8.625),
        (0, 4, 12.375),
    ]]
    chamfer(chamfer1_edges, length=CHAMFER1_SIZE)


solid = part.part
